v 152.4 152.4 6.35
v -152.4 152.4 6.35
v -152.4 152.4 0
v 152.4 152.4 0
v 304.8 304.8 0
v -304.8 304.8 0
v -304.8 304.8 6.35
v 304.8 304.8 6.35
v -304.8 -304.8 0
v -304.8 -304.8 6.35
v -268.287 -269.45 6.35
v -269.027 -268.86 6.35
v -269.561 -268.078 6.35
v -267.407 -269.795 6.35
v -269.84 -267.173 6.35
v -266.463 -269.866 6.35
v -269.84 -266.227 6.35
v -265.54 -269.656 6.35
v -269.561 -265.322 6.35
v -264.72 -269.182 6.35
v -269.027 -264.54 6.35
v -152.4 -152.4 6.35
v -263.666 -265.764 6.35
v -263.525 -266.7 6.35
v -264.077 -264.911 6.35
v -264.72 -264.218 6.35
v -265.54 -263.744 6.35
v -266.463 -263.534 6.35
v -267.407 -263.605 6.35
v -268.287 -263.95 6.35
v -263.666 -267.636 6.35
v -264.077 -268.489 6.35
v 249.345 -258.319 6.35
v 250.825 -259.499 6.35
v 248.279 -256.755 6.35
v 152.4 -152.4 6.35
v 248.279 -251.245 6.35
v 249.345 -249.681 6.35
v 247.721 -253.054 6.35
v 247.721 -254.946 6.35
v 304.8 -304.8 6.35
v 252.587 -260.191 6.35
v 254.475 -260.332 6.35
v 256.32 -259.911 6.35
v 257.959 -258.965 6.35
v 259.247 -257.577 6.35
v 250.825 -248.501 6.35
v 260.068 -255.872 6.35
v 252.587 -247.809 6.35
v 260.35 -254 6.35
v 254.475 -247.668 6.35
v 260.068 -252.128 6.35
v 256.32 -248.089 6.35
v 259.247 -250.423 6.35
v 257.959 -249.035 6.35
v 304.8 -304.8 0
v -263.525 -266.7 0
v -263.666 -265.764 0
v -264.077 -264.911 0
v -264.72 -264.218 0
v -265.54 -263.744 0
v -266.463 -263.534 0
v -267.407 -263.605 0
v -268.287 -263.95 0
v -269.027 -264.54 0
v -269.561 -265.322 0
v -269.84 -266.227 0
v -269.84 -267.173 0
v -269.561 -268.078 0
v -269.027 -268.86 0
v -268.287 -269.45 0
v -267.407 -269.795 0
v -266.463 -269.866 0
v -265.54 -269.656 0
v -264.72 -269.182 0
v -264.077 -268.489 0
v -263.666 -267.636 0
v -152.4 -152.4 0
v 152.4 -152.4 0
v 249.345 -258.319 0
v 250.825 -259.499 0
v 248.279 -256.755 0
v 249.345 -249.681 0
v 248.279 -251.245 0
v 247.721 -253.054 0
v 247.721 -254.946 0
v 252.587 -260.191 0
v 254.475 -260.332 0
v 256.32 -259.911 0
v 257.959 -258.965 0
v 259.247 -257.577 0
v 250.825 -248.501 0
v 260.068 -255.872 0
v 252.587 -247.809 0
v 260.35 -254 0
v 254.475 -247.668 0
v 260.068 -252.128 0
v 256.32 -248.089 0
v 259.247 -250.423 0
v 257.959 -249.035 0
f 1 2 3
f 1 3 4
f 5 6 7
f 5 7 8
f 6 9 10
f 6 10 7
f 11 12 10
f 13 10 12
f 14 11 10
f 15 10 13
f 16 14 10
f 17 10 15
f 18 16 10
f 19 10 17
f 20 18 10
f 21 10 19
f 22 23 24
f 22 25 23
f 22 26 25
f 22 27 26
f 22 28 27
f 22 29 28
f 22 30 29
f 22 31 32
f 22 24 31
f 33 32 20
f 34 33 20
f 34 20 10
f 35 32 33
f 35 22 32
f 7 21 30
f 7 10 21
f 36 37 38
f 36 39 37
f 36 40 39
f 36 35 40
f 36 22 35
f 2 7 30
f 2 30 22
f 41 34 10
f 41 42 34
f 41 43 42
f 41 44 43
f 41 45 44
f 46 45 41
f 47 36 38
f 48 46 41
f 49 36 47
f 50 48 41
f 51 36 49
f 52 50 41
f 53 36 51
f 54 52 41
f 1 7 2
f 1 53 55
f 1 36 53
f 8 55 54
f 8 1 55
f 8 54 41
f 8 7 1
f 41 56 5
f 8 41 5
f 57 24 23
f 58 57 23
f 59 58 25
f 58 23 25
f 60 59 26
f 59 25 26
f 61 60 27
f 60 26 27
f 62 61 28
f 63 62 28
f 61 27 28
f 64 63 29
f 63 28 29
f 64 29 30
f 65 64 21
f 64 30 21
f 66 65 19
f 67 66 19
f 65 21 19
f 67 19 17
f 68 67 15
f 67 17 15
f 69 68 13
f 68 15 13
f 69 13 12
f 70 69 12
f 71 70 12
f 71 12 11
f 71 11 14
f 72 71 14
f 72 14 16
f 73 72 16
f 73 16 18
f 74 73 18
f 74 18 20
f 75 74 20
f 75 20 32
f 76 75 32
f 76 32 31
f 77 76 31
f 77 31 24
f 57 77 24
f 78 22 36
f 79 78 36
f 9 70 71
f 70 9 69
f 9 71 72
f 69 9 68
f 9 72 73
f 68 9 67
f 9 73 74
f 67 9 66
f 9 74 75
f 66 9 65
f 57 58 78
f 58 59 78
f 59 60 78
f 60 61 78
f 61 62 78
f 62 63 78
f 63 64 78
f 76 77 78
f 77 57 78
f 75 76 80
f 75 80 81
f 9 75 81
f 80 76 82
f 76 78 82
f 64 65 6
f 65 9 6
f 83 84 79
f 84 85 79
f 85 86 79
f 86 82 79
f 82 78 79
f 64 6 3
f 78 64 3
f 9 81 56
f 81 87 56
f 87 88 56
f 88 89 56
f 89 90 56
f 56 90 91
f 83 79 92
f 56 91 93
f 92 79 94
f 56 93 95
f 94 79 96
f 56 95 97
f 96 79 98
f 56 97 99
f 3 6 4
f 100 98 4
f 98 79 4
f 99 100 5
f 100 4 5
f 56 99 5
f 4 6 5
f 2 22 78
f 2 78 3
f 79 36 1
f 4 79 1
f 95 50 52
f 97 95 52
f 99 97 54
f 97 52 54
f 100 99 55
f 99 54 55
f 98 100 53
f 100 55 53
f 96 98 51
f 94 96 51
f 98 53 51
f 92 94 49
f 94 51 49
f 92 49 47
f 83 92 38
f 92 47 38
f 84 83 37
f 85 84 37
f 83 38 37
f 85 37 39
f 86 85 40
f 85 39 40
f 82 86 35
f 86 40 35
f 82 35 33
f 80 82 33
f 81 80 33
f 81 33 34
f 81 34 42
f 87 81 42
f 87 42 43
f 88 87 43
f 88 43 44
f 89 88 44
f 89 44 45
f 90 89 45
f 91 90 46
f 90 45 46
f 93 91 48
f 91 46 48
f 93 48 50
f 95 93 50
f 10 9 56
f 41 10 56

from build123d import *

# Parameters (mm, degrees)
SKETCH1_W           = 609.6
SKETCH1_H           = 609.6
BOSS_EXTRUDE1_DEPTH = 6.35
SKETCH2_R           = 6.35
CUT_EXTRUDE1_DEPTH  = 6.35
SKETCH3_W           = 304.8
SKETCH3_H           = 304.8
CUT_EXTRUDE2_DEPTH  = 432.099063441
SKETCH4_R           = 3.175
CUT_EXTRUDE3_DEPTH  = 432.099063441


with BuildPart() as part:
    # Sketch1 → Boss-Extrude1 (new body)
    with BuildSketch(Plane.XY):
        Rectangle(SKETCH1_W, SKETCH1_H)
    extrude(amount=BOSS_EXTRUDE1_DEPTH)

    # Sketch2 → Cut-Extrude1 (cut)
    with BuildSketch(Plane.XY.offset(6.35)):
        with Locations((254, -254)):
            Circle(SKETCH2_R)
    extrude(amount=-CUT_EXTRUDE1_DEPTH, mode=Mode.SUBTRACT)

    # Sketch3 → Cut-Extrude2 (cut, through all)
    with BuildSketch(Plane.XY.offset(6.35)):
        Rectangle(SKETCH3_W, SKETCH3_H)
    extrude(amount=-CUT_EXTRUDE2_DEPTH, mode=Mode.SUBTRACT)

    # Sketch4 → Cut-Extrude3 (cut, through all)
    with BuildSketch(Plane.XY.offset(6.35)):
        with Locations((-266.7, -266.7)):
            Circle(SKETCH4_R)
    extrude(amount=-CUT_EXTRUDE3_DEPTH, mode=Mode.SUBTRACT)


solid = part.part
